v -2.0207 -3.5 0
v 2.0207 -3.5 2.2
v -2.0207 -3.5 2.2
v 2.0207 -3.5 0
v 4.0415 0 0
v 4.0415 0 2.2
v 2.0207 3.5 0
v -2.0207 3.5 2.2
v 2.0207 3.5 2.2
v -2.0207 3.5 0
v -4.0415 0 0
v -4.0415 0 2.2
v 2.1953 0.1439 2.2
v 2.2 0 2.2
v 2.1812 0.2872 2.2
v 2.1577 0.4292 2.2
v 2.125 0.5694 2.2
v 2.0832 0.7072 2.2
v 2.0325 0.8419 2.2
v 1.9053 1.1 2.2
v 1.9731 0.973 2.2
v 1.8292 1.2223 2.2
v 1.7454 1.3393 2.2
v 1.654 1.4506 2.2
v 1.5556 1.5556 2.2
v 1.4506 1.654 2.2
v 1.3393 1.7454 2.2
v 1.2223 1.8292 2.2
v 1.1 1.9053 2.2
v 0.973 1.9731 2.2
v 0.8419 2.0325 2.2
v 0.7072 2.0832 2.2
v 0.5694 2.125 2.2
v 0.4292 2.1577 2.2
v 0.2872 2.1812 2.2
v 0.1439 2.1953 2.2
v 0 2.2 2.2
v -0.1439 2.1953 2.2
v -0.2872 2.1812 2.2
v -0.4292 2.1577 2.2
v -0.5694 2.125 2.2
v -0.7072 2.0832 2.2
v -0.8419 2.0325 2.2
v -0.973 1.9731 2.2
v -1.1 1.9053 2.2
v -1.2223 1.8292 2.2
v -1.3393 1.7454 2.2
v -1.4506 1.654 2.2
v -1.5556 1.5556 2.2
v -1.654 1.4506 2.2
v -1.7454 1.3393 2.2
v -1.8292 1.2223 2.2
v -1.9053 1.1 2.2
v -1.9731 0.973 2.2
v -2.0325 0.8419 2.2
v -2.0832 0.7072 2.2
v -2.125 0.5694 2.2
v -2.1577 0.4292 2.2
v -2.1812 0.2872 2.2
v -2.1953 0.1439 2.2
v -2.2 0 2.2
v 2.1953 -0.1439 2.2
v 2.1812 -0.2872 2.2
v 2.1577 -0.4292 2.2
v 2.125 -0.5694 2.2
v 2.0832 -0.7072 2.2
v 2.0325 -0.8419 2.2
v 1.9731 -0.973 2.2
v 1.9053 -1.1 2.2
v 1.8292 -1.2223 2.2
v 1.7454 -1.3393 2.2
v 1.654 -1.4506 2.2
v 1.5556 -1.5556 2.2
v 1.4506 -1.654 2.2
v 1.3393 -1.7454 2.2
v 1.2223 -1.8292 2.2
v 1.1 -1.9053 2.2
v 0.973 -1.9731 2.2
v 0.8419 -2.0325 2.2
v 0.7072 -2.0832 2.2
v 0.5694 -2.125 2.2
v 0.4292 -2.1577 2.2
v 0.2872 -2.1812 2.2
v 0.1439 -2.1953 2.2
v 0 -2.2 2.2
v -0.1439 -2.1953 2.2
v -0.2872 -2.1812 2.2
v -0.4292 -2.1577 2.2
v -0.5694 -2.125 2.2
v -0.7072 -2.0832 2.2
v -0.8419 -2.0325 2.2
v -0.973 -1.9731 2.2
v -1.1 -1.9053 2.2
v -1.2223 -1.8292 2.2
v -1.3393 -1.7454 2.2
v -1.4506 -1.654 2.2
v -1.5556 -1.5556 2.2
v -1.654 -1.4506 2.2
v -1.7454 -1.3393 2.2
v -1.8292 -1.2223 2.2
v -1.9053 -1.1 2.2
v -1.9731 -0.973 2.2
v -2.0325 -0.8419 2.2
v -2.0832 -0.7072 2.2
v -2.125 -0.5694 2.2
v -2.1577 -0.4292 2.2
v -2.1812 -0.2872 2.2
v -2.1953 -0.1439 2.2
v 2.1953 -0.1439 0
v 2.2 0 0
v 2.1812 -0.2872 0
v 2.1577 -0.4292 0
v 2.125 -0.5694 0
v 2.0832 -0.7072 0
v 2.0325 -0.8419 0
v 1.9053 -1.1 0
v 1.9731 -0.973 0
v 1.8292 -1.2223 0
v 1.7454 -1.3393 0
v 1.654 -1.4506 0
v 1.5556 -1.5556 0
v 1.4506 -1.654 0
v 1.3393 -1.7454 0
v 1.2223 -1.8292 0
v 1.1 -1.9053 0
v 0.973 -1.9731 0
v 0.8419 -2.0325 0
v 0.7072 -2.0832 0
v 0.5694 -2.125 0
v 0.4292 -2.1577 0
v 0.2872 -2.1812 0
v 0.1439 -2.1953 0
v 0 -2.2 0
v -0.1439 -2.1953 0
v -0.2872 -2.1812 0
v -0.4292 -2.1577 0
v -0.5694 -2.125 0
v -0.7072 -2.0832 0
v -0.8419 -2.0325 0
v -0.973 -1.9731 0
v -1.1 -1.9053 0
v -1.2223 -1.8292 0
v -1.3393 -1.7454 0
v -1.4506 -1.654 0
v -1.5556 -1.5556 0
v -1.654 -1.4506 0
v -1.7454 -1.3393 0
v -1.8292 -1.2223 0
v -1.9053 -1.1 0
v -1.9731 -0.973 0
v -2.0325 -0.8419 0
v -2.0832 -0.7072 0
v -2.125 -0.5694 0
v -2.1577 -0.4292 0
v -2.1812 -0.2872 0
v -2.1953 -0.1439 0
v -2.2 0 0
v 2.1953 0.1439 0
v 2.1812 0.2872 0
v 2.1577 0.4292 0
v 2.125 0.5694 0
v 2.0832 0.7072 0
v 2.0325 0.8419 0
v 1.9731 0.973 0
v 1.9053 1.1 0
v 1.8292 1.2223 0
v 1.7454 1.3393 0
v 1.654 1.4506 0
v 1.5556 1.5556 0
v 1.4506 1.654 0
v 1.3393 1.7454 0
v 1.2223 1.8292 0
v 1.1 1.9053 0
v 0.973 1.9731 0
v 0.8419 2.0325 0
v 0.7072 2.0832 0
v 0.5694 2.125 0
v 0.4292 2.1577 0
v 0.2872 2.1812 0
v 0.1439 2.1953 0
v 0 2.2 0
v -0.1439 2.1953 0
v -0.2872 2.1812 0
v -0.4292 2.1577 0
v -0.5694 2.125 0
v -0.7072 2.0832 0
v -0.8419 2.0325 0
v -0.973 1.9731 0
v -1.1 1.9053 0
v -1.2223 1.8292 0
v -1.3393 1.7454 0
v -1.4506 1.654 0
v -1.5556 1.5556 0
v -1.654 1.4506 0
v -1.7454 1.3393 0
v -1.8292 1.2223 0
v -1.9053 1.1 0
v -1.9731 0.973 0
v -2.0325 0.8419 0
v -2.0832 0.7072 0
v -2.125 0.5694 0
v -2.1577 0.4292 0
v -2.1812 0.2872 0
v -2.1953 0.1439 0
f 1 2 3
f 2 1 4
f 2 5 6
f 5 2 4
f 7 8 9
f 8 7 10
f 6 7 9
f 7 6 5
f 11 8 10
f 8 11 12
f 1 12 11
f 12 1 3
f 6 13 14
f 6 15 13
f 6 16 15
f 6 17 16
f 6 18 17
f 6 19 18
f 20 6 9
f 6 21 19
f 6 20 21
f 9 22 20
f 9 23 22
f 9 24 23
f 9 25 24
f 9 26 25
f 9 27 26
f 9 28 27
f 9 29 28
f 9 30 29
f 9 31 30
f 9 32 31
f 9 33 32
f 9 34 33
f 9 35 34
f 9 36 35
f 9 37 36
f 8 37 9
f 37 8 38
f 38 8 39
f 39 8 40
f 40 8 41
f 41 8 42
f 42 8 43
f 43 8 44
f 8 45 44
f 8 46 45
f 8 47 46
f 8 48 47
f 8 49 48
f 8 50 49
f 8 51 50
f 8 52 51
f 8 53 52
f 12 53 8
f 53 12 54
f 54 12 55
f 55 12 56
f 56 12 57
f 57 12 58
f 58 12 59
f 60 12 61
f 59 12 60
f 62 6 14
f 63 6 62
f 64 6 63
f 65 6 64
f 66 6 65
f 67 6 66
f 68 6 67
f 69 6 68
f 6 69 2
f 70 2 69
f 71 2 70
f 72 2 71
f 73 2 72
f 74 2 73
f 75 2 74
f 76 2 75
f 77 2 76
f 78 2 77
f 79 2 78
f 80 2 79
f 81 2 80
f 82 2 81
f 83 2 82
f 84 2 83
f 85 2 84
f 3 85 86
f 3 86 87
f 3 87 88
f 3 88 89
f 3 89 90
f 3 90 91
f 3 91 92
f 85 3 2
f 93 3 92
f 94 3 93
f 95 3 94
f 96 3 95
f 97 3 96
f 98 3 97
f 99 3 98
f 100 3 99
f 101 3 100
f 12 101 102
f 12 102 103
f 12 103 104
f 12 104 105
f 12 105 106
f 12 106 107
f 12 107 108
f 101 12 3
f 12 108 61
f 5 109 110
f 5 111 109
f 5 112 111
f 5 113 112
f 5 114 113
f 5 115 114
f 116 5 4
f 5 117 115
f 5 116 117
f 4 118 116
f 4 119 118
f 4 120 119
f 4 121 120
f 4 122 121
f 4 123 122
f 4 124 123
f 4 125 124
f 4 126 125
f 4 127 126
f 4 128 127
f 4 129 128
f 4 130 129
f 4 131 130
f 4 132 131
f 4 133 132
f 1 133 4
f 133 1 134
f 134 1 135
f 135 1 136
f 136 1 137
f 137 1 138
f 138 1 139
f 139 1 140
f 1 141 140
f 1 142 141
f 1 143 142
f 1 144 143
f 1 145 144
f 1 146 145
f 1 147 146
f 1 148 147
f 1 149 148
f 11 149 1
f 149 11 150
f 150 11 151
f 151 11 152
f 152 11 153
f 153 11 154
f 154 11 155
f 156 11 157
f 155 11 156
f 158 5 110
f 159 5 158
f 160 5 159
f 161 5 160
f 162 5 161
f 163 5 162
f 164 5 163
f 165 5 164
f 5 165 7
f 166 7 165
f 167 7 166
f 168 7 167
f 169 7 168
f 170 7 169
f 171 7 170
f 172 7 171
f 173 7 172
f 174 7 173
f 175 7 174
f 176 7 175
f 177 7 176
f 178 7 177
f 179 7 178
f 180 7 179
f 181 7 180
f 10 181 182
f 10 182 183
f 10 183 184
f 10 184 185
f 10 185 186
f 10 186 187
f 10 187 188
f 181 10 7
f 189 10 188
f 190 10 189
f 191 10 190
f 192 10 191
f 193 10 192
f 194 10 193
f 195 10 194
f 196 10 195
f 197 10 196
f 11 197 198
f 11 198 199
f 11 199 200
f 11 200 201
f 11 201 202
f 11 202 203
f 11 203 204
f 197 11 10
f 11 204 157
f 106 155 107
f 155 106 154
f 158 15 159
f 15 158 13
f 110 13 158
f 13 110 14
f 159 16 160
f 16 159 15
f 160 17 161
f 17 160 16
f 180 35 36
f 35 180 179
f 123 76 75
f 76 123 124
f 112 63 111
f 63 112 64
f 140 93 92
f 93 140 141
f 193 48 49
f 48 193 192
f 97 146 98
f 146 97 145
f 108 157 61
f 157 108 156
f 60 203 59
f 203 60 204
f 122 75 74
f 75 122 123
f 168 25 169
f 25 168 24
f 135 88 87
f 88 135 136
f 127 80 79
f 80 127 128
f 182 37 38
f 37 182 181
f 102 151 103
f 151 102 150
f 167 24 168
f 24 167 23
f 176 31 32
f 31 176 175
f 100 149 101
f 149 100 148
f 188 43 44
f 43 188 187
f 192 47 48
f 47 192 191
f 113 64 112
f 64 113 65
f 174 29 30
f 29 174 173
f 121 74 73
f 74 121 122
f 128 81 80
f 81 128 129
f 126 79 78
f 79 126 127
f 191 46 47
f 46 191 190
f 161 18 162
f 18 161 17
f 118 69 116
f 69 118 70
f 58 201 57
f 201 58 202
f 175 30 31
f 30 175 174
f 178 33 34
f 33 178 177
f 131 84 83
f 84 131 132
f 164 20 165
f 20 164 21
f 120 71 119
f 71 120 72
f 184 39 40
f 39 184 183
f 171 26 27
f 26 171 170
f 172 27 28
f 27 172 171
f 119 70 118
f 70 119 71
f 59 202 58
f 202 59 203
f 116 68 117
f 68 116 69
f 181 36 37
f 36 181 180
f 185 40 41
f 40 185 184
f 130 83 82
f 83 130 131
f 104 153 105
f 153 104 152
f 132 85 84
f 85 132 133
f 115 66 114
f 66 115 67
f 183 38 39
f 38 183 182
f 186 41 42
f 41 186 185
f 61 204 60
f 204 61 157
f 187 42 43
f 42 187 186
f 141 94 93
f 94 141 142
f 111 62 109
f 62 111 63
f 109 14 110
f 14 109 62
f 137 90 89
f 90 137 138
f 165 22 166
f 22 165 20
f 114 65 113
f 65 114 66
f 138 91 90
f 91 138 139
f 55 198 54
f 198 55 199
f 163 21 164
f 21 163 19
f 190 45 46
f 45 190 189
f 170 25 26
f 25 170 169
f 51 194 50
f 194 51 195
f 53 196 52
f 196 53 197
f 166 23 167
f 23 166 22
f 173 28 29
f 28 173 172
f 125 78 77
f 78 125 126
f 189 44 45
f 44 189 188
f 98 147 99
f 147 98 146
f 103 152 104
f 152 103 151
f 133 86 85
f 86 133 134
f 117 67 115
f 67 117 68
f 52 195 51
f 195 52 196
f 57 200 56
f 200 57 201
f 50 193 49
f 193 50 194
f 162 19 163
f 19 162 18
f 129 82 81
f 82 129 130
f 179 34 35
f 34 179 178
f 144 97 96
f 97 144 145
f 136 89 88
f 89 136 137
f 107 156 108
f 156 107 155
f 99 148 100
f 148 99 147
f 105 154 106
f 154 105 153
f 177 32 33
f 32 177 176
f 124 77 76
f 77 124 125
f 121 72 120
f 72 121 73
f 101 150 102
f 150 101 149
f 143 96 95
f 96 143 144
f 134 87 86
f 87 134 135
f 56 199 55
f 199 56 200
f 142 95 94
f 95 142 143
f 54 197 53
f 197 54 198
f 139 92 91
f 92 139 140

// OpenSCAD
$fn = 96;

screw_d = 4.0;          // nominal screw diameter (M4)
clearance = 0.4;        // typical clearance for printed parts
hole_d = screw_d + clearance;

across_flats = 7.0;     // hex nut AF
thickness = 2.2;

module hex_prism_af(af, h) {
    // For a regular hexagon, circumradius R = AF / sqrt(3)
    R = af / sqrt(3);
    cylinder(h = h, r = R, $fn = 6);
}

difference() {
    hex_prism_af(across_flats, thickness);
    translate([0,0,-0.2])
        cylinder(h = thickness + 0.4, d = hole_d, $fn = 96);
}
